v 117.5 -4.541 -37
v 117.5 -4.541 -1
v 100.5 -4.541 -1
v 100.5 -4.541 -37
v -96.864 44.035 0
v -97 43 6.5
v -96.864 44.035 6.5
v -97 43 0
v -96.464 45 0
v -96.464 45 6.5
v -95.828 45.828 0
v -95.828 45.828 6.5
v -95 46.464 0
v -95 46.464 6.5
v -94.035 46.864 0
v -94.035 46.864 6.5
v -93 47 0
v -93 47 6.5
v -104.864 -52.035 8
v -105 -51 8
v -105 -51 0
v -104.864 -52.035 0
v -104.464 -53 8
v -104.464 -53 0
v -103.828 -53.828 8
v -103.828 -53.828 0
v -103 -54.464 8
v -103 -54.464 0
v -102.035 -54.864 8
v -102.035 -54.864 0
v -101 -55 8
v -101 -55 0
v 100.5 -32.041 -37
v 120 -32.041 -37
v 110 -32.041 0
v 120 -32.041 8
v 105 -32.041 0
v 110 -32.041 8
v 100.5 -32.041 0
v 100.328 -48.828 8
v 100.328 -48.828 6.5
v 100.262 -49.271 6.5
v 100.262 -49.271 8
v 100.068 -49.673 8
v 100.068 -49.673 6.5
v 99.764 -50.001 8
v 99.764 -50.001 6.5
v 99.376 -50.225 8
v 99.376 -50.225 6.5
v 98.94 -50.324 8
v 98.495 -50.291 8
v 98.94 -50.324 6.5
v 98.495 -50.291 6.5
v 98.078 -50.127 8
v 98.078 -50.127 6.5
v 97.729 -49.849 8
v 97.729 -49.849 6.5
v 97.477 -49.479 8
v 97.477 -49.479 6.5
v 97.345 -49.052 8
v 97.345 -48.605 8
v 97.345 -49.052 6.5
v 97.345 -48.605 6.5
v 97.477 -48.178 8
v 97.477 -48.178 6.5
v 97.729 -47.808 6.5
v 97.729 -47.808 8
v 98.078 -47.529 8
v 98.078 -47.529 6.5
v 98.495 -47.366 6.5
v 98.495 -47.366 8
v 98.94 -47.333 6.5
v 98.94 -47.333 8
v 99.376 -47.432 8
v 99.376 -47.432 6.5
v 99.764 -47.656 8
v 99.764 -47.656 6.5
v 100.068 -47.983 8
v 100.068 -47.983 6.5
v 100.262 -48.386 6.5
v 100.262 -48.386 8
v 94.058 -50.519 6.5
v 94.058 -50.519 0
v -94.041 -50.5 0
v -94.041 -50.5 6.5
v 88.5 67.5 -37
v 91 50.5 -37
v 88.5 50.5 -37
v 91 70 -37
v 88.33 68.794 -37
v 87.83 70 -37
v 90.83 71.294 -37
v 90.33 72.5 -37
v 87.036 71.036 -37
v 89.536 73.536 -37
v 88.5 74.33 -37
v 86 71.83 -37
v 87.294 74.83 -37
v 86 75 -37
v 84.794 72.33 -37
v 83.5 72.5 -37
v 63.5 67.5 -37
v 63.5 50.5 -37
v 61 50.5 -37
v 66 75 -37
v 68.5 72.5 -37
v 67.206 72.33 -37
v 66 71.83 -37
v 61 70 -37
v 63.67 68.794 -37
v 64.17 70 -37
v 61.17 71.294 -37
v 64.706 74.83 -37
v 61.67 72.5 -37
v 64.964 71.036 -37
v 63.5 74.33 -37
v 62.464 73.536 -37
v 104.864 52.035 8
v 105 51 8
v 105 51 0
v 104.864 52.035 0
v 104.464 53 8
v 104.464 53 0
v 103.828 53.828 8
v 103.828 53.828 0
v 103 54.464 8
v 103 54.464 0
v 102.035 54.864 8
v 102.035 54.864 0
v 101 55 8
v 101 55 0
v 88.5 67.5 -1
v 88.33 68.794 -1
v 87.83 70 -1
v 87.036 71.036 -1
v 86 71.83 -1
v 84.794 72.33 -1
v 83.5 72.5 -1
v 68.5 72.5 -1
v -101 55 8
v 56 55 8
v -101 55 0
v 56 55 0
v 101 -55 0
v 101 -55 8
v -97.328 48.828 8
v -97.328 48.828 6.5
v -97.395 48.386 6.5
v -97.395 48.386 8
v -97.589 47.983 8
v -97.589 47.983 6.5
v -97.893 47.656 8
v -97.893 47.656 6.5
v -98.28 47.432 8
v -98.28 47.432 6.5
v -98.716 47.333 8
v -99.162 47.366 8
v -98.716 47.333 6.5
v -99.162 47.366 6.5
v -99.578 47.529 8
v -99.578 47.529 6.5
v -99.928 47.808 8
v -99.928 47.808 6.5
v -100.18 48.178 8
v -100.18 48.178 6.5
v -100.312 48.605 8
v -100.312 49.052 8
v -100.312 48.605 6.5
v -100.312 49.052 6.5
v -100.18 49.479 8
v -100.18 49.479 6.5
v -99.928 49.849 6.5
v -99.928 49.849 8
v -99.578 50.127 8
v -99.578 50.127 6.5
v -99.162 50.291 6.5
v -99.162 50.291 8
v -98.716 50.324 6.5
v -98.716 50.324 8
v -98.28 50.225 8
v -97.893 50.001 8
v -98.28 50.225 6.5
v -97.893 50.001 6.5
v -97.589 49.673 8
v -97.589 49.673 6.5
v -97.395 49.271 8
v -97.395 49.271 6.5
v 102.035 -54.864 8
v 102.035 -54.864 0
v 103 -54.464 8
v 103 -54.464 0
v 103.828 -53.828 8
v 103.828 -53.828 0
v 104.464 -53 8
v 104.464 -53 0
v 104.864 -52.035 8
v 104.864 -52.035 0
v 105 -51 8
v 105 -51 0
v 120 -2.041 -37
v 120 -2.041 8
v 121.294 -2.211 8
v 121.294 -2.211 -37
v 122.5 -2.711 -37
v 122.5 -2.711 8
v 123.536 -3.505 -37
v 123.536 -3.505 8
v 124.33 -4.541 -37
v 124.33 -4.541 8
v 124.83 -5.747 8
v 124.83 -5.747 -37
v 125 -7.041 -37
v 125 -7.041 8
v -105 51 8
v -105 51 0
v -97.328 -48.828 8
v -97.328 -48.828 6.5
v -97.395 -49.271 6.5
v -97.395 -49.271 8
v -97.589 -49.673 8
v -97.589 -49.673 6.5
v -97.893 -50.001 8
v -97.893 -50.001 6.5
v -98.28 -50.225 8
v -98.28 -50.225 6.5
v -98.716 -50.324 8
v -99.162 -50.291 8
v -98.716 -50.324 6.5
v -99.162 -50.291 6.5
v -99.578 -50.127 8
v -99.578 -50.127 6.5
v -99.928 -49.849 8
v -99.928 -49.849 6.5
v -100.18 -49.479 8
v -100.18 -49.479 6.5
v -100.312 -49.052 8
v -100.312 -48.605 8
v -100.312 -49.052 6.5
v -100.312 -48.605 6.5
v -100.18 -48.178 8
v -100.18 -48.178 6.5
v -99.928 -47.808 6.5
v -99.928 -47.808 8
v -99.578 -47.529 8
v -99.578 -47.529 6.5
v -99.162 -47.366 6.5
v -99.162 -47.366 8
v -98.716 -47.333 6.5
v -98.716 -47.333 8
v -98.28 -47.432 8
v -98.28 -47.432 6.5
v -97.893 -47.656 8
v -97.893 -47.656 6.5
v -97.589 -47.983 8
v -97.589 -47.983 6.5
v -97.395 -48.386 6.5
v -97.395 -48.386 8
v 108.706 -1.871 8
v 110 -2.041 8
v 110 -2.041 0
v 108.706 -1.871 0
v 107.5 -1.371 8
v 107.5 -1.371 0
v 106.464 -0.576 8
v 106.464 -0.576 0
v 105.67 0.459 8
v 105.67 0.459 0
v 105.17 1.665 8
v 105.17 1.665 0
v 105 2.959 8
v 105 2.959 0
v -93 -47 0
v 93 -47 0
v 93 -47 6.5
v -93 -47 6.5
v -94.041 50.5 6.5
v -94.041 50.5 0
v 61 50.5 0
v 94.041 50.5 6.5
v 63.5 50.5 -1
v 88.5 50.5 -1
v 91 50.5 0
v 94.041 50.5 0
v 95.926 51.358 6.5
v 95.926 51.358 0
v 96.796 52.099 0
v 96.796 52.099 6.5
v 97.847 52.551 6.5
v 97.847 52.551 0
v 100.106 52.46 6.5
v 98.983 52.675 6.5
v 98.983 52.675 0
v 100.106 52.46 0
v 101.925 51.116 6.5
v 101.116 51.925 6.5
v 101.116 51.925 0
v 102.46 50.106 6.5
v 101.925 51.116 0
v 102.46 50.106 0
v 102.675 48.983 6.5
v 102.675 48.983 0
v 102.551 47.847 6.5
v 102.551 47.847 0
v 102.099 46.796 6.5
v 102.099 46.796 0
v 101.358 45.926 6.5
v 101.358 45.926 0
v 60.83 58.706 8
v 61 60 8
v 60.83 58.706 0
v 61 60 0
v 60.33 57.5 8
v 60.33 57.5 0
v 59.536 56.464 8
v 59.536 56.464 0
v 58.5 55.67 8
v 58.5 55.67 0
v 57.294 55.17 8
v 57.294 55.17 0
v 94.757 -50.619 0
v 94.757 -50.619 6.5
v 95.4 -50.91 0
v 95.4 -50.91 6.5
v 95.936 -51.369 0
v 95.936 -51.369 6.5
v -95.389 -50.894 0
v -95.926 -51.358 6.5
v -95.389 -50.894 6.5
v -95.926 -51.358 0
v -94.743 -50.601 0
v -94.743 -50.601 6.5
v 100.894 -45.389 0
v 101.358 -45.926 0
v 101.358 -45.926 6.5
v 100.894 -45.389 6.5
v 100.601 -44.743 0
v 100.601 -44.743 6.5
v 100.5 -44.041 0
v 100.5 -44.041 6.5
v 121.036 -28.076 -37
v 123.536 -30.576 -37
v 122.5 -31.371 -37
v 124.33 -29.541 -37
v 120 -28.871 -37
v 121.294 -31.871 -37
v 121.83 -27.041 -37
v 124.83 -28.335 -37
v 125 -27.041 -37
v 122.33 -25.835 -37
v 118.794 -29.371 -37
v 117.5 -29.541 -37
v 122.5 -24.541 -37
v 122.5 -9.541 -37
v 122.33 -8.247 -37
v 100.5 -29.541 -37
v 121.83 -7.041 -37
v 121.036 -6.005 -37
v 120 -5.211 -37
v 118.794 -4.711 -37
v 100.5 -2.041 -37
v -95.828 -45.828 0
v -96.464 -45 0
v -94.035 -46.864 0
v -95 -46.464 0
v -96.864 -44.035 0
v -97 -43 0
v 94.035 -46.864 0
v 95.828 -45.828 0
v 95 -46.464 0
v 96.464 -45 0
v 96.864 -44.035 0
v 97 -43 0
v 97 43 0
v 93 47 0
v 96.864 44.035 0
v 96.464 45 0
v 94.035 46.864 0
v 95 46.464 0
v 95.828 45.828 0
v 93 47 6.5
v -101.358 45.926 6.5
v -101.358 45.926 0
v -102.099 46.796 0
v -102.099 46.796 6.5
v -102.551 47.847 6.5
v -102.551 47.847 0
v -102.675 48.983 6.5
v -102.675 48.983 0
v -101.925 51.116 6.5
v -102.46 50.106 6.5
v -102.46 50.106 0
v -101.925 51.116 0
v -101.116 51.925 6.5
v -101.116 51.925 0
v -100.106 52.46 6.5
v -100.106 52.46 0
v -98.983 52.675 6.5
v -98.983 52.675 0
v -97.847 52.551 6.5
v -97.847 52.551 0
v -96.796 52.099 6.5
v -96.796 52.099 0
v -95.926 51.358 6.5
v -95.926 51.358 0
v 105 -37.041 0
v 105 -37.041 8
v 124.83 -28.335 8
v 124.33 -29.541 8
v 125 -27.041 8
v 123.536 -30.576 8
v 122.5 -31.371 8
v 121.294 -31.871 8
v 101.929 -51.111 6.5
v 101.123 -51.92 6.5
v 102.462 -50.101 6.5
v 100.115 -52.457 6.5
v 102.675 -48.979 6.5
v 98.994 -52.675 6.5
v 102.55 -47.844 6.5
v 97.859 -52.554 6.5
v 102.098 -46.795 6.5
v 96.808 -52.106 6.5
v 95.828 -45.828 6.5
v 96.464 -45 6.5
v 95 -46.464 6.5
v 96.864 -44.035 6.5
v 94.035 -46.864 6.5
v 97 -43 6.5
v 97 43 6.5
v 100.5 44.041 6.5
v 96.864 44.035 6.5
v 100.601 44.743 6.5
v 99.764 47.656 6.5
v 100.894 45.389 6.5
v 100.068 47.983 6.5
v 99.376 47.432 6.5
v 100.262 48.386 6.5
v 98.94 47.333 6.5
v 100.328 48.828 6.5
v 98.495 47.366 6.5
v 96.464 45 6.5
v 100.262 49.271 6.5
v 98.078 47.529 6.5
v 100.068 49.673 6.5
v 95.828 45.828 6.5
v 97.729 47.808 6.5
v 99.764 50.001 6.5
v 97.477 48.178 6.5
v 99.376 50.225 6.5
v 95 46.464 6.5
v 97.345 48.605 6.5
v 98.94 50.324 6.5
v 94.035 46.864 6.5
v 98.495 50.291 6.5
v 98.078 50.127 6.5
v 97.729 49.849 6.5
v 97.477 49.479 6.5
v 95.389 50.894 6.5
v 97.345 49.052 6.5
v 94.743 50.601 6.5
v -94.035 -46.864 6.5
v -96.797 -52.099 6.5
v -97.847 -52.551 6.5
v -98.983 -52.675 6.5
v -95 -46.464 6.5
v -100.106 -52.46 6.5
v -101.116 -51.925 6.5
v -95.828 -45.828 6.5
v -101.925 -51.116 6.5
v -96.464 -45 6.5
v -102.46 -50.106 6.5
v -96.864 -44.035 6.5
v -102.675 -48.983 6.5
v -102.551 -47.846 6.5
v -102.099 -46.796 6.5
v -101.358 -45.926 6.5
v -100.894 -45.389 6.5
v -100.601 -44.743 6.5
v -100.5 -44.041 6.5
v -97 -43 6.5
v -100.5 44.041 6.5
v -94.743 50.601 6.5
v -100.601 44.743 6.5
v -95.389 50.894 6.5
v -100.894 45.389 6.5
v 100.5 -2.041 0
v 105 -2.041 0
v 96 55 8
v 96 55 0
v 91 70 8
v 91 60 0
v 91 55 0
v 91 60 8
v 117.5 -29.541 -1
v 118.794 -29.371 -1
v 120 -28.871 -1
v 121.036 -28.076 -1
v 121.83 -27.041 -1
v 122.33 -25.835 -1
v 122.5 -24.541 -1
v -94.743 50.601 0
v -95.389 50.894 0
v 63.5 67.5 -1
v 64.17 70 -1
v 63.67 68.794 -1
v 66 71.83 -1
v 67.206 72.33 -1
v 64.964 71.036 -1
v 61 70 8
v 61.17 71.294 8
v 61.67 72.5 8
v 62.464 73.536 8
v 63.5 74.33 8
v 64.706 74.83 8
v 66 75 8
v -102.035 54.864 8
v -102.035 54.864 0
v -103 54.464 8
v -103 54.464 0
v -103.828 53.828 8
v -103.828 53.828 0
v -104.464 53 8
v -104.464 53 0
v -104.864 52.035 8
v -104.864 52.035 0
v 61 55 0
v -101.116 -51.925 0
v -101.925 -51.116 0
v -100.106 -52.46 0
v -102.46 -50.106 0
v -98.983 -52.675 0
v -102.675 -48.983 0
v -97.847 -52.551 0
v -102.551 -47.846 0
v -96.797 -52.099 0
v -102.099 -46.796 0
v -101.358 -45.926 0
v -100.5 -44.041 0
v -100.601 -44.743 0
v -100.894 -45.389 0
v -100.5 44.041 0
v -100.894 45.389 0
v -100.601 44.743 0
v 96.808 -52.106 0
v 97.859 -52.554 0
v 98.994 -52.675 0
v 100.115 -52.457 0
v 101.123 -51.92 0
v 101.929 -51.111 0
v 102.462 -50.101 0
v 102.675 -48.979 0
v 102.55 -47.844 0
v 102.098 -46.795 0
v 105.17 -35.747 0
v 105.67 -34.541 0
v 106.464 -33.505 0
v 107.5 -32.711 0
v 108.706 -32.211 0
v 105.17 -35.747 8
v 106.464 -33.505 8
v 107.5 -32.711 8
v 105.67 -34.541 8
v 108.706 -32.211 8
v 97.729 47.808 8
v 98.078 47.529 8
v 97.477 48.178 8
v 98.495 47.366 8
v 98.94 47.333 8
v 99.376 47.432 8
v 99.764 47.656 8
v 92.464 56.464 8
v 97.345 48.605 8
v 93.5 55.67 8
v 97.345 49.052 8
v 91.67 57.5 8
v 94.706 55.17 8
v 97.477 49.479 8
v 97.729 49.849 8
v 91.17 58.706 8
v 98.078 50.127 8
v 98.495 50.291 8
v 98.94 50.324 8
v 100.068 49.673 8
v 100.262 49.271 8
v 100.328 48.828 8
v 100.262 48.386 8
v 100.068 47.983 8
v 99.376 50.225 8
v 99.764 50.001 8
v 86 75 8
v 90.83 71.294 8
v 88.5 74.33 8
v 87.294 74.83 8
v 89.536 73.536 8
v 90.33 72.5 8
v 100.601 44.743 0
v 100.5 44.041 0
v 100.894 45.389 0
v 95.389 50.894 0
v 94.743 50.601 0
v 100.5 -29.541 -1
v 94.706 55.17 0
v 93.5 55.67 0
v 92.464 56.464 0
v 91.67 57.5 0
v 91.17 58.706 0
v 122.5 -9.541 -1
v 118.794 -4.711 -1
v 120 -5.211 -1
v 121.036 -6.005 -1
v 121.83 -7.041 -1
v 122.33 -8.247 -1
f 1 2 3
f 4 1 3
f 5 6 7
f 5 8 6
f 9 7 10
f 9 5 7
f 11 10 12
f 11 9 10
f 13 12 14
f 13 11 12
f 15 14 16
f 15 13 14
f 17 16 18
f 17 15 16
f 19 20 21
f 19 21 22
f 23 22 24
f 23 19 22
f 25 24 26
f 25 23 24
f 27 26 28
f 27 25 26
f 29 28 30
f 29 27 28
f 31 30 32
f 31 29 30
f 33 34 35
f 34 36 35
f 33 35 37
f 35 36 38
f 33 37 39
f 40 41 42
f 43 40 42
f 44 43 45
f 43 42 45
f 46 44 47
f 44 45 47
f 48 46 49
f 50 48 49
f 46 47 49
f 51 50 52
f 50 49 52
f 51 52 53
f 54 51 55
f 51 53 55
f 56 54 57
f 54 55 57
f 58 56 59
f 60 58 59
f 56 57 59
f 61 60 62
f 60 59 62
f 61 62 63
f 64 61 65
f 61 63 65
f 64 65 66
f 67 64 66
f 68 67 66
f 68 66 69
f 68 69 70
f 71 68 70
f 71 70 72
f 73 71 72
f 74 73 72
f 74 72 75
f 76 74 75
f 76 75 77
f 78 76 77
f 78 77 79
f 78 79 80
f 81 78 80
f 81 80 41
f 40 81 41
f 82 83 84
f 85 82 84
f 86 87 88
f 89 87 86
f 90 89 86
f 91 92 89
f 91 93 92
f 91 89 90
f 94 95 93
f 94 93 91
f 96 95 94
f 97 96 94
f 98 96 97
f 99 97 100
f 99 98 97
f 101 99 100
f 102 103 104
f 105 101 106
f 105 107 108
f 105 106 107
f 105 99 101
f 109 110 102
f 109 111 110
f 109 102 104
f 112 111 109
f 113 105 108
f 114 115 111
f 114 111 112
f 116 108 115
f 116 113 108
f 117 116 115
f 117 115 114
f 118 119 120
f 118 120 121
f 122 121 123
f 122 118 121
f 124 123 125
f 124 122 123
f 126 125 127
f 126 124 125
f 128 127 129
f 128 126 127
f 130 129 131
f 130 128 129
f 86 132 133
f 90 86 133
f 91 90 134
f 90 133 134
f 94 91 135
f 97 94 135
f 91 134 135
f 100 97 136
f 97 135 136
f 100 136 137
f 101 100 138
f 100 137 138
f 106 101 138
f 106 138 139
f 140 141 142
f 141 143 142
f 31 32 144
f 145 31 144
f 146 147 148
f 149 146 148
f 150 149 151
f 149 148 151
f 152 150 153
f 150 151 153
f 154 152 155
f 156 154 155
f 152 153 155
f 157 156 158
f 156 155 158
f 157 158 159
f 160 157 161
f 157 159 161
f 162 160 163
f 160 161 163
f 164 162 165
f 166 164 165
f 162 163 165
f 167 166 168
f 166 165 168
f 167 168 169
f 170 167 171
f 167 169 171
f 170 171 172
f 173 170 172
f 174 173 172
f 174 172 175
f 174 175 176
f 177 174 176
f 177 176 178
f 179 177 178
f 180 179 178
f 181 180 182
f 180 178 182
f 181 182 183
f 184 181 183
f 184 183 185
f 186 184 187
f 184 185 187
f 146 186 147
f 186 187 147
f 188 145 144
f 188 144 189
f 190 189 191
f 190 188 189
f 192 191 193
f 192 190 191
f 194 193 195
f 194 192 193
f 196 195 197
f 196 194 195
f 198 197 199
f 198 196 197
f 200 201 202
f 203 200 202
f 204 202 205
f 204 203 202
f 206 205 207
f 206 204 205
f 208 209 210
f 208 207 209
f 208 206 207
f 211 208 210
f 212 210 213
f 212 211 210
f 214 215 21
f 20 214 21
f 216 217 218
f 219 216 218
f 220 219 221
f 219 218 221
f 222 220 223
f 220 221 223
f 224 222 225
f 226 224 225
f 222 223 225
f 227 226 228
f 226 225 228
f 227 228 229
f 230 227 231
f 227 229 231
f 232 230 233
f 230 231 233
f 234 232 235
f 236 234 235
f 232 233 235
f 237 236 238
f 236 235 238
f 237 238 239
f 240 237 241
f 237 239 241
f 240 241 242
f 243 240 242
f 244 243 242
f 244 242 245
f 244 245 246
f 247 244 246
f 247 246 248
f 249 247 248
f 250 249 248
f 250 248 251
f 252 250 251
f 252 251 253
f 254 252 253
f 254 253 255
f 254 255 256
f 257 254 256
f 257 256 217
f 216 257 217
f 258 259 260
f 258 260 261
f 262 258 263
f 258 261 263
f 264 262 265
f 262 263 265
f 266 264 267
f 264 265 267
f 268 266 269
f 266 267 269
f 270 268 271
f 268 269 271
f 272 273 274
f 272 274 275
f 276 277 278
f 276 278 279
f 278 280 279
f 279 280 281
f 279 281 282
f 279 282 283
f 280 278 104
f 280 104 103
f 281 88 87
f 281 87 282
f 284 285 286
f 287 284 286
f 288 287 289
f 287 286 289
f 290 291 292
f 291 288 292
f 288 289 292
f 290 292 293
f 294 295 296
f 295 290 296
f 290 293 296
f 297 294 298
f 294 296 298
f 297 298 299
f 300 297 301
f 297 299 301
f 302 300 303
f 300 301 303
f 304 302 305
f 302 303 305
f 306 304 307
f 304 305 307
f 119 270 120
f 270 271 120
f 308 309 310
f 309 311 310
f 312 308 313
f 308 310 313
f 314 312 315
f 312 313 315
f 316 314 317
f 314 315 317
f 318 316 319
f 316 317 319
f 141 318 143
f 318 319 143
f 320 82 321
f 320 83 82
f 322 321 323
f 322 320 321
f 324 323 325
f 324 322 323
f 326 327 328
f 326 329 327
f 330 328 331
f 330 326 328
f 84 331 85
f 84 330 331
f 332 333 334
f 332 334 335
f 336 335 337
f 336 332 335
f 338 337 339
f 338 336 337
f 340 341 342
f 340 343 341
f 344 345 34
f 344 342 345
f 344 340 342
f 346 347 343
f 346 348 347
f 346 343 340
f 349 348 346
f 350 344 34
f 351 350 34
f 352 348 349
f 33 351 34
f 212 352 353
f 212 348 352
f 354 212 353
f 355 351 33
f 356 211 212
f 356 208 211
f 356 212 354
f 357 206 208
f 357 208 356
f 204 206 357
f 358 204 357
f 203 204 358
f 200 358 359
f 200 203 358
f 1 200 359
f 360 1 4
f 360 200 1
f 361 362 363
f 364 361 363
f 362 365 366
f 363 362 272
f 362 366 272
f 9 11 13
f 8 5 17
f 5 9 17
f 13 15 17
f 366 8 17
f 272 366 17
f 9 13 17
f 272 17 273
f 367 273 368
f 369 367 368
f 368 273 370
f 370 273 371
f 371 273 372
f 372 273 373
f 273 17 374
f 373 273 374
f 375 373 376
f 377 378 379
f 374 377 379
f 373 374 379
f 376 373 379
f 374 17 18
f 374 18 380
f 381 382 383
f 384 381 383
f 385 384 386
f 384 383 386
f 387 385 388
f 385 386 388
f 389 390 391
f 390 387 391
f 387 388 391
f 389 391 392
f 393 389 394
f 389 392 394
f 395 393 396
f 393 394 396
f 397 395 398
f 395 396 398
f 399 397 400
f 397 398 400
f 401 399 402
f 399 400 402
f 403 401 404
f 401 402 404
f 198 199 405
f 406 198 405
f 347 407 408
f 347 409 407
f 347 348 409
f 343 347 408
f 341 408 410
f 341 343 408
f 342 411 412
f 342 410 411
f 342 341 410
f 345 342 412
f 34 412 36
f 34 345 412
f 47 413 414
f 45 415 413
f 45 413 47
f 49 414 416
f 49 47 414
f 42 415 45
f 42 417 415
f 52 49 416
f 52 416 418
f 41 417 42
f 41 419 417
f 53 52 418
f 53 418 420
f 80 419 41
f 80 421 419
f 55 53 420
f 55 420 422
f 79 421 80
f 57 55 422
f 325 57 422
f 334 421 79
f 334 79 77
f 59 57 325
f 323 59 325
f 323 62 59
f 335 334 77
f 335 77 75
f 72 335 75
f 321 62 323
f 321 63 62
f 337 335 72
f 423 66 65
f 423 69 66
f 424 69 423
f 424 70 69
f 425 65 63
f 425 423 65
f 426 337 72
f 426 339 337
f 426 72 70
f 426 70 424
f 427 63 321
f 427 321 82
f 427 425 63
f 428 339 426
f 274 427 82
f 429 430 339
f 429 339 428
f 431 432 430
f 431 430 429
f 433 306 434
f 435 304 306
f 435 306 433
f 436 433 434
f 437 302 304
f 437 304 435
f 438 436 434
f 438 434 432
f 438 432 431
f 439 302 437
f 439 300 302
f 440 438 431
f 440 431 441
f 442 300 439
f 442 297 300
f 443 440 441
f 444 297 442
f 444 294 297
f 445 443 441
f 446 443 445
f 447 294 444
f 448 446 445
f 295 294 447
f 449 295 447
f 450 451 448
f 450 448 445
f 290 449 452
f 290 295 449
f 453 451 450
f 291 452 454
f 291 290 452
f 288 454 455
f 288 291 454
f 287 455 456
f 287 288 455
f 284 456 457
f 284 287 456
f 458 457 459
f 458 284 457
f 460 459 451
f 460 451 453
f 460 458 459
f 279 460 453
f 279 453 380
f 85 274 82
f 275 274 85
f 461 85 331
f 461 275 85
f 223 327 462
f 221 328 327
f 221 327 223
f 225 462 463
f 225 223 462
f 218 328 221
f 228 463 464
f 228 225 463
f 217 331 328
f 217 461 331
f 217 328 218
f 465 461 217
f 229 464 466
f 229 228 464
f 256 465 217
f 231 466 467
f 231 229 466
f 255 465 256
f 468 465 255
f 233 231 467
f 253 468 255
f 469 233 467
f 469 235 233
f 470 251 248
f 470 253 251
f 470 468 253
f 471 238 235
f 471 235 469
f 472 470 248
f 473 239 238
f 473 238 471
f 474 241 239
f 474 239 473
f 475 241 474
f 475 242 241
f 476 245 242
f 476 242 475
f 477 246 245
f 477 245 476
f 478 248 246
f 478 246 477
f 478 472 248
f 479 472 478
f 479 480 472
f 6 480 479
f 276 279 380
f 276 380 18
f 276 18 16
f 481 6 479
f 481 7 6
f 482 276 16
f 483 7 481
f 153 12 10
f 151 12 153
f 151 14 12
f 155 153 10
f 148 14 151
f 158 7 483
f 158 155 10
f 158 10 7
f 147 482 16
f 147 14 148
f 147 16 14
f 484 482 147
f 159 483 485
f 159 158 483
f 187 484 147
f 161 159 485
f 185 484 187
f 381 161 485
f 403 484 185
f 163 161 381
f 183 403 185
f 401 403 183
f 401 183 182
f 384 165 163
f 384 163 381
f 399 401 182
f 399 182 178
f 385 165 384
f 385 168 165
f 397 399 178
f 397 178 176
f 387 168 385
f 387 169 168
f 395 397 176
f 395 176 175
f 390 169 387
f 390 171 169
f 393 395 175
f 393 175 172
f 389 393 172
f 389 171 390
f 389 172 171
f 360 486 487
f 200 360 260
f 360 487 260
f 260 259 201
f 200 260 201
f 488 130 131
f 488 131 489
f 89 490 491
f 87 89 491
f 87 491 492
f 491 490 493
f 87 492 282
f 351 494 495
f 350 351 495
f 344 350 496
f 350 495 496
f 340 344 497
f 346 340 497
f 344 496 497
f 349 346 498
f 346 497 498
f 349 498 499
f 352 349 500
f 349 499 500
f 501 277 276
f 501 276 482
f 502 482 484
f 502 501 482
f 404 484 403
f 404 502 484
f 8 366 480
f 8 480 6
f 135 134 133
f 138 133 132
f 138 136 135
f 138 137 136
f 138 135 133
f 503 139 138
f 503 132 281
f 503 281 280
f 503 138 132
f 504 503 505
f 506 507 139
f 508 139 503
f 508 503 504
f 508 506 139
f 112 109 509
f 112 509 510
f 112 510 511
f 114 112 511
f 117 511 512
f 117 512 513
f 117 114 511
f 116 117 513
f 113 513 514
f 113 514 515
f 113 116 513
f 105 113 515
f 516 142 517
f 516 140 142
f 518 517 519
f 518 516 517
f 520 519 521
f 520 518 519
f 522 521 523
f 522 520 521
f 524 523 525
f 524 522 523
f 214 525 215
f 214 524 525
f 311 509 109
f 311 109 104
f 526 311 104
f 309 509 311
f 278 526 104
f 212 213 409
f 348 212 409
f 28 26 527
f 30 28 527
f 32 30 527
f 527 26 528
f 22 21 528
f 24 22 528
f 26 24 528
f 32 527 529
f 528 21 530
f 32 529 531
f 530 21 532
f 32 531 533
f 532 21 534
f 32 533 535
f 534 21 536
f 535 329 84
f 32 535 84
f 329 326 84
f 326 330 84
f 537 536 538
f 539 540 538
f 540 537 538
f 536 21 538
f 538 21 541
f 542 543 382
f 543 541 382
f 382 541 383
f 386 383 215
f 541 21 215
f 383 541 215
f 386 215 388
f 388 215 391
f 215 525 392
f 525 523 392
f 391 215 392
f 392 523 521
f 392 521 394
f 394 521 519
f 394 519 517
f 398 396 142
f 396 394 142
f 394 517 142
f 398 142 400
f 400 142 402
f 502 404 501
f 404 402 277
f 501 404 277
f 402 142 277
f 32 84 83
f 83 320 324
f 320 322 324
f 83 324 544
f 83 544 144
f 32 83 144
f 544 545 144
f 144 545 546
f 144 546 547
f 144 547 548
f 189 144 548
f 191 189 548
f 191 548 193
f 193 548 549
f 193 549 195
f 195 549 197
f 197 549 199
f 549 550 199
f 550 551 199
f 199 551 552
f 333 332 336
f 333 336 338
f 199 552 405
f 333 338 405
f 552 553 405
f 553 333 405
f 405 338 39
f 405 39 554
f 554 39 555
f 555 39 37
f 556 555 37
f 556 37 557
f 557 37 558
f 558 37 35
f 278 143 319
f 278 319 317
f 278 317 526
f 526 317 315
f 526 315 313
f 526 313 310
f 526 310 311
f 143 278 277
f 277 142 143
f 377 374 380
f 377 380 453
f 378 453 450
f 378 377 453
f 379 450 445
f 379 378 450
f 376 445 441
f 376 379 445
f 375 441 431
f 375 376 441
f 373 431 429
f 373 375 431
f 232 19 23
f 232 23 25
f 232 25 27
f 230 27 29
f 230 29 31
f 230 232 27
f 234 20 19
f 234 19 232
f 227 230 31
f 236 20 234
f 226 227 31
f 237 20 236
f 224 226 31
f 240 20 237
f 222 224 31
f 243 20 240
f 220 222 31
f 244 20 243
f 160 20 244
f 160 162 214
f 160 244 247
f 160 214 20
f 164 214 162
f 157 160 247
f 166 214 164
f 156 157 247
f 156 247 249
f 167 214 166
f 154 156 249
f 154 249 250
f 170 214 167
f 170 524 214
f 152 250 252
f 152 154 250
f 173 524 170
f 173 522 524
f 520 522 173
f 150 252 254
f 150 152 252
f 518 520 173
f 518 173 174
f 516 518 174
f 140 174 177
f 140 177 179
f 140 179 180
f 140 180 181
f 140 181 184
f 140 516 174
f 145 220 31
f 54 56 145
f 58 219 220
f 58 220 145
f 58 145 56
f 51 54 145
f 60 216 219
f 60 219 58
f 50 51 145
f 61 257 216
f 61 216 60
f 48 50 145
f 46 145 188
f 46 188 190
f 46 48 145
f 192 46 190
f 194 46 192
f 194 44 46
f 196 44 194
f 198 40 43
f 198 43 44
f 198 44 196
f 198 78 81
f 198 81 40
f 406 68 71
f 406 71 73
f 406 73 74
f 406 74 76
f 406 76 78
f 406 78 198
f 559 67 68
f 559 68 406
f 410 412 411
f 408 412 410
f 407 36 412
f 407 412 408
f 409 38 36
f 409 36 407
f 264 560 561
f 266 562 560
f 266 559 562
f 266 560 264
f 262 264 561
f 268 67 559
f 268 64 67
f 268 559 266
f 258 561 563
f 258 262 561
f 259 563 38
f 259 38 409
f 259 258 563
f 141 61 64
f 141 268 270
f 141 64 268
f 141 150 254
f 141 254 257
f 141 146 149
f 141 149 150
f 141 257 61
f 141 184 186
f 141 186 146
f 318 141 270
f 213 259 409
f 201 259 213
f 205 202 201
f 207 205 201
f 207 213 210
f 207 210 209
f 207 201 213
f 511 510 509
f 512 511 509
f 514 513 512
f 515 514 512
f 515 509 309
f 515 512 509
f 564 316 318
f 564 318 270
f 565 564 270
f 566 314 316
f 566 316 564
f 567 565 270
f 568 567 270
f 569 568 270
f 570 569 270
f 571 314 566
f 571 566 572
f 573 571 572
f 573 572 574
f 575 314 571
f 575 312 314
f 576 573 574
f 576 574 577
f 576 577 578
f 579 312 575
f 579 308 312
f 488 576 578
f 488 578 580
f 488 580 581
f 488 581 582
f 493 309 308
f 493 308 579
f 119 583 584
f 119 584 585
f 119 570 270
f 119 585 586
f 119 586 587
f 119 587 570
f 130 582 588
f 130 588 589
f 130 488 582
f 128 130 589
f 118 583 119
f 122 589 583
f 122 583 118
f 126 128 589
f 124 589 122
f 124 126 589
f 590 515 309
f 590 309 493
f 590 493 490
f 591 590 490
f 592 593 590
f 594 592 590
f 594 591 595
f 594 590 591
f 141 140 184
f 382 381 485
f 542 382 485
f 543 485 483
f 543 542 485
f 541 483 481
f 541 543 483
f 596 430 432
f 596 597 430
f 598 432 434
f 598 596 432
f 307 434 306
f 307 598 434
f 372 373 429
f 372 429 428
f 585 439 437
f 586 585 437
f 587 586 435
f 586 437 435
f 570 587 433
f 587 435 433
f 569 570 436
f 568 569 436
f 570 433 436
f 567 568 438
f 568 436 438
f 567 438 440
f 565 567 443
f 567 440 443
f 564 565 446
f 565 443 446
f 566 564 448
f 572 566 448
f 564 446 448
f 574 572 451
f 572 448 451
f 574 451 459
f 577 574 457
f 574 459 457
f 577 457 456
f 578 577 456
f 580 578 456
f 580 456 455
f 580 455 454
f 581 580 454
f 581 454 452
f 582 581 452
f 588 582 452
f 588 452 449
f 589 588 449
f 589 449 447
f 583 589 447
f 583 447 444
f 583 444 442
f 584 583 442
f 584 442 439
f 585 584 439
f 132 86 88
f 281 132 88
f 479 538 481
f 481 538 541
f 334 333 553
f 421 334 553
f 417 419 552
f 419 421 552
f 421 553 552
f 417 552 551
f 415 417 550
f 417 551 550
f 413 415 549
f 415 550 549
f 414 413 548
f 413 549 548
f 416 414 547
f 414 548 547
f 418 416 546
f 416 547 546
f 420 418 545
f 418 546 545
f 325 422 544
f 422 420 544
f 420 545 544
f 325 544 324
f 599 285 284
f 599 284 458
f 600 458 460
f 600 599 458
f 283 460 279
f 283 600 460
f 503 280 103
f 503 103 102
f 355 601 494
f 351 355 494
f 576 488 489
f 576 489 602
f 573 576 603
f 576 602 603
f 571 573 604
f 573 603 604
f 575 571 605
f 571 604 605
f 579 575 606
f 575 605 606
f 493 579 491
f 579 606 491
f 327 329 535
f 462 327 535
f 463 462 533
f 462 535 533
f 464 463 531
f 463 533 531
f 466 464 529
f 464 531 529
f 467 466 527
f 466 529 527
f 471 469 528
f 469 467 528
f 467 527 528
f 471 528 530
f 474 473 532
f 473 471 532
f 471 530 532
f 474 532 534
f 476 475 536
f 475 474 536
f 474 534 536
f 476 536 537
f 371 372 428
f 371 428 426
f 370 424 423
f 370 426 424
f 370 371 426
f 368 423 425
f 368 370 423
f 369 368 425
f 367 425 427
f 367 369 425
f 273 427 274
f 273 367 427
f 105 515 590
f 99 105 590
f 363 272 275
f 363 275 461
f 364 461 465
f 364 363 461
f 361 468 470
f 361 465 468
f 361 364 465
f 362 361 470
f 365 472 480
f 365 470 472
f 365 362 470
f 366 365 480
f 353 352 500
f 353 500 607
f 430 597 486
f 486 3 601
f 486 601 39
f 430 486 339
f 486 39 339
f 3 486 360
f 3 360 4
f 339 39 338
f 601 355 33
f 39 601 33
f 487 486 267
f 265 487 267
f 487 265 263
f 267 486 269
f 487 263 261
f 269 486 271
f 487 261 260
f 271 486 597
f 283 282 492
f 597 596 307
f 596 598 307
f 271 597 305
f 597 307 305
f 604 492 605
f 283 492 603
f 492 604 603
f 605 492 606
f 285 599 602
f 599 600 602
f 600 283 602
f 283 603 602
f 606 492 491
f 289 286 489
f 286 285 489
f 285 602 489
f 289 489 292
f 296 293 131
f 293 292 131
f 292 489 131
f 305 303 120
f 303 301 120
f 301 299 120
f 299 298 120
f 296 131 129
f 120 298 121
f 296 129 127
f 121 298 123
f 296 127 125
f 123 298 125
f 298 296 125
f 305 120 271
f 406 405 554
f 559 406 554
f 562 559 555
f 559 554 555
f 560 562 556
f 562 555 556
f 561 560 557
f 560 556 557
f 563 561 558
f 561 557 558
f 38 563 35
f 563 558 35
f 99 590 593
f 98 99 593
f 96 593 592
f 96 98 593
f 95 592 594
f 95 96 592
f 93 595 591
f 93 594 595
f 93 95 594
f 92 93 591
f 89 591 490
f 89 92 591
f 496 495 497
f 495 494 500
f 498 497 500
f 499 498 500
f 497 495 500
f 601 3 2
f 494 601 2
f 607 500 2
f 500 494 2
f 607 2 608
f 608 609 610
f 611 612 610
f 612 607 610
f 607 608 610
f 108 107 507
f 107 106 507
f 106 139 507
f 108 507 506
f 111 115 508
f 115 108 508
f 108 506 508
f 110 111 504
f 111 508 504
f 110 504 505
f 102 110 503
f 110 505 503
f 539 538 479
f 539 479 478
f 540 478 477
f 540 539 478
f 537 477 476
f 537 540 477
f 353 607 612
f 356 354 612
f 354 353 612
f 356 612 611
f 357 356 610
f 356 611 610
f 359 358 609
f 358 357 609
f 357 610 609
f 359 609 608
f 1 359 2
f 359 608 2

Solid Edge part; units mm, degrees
sketch "Sketch1" plane through (0, 0, 0) normal (0, 0, 1) x (1, 0, 0)
  line L0 (-105, 55) -> (-105, -55)
  line L1 (-105, -55) -> (105, -55)
  line L2 (105, -55) -> (105, 55)
  line L3 (105, 55) -> (-105, 55)
extrude "Protrusion1" add sketch "Sketch1" along normal blind 8
sketch "Sketch2" plane through (0, 0, 0) normal (0, 0, -1) x (1, 0, 0)
  line L0 (-94.0409, -50.5) -> (94.0409, -50.5)
  arc A0 (95.9257, -51.3576) -> (94.0409, -50.5) centre (94.0409, -53) ccw
  arc A1 (101.3576, -45.9257) -> (95.9257, -51.3576) centre (98.8284, -48.8284) cw
  arc A2 (100.5, -44.0409) -> (101.3576, -45.9257) centre (103, -44.0409) ccw
  line L1 (100.5, -44.0409) -> (100.5, 44.0409)
  arc A3 (101.3576, 45.9257) -> (100.5, 44.0409) centre (103, 44.0409) ccw
  arc A4 (95.9359, 51.3692) -> (101.3576, 45.9257) centre (98.8284, 48.8284) cw
  arc A5 (94.0579, 50.5191) -> (95.9359, 51.3692) centre (94.0576, 53.0191) ccw
  line L2 (94.0579, 50.5191) -> (-94.0408, 50.5001)
  arc A6 (-95.9258, 51.3577) -> (-94.0408, 50.5001) centre (-94.041, 53.0001) ccw
  arc A7 (-101.3576, 45.9257) -> (-95.9258, 51.3577) centre (-98.8284, 48.8284) cw
  arc A8 (-100.5, 44.0409) -> (-101.3576, 45.9257) centre (-103, 44.0409) ccw
  line L3 (-100.5, 44.0409) -> (-100.5, -44.0409)
  arc A9 (-101.3576, -45.9257) -> (-100.5, -44.0409) centre (-103, -44.0409) ccw
  arc A10 (-95.9257, -51.3576) -> (-101.3576, -45.9257) centre (-98.8284, -48.8284) cw
  arc A11 (-94.0409, -50.5) -> (-95.9257, -51.3576) centre (-94.0409, -53) ccw
  line L4 (97, -43) -> (97, 43)
  arc A12 (93, 47) -> (97, 43) centre (93, 43) cw
  line L5 (93, 47) -> (-93, 47)
  arc A13 (-97, 43) -> (-93, 47) centre (-93, 43) cw
  line L6 (-97, 43) -> (-97, -43)
  arc A14 (-97, -43) -> (-93, -47) centre (-93, -43) ccw
  line L7 (-93, -47) -> (93, -47)
  arc A15 (97, -43) -> (93, -47) centre (93, -43) cw
extrude "Wycięcie_1" cut sketch "Sketch2" against normal blind 6.5
sketch "Sketch3" plane through (0, 0, 0) normal (0, 0, -1) x (1, 0, 0)
  circle A0 centre (-98.8284, 48.8284) radius 1.5
  circle A1 centre (98.8284, 48.8284) radius 1.5
  circle A2 centre (98.8284, -48.8284) radius 1.5
  circle A3 centre (-98.8284, -48.8284) radius 1.5
extrude "Wycięcie_2" cut sketch "Sketch3" against normal blind 159.0153
fillet "Zaokrąglenie_1" radius 4 4 edges at (105, -55, 4) (105, 55, 4) (-105, 55, 4) (-105, -55, 4)
sketch "Sketch4" plane through (0, 0, 8) normal (0, 0, 1) x (0, 1, 0)
  line L0 (55, -61) -> (75, -61)
  line L1 (75, -61) -> (75, -91)
  line L2 (75, -91) -> (55, -91)
  line L3 (50.5, -91) -> (55, -91)
  line L4 (50.5, -61) -> (50.5, -91)
  line L5 (55, -61) -> (50.5, -61)
  line L6 (-32.0409, -125) -> (-32.0409, -105)
  line L7 (-32.0409, -105) -> (-32.0409, -100.5)
  line L8 (-32.0409, -100.5) -> (-2.0409, -100.5)
  line L9 (-2.0409, -100.5) -> (-2.0409, -105)
  line L10 (-2.0409, -105) -> (-2.0409, -125)
  line L11 (-2.0409, -125) -> (-32.0409, -125)
extrude "Wyciągnięcie_2" add sketch "Sketch4" against normal blind 45
sketch "Sketch5" plane through (76, 65, -37) normal (0, 0, -1) x (-1, 0, 0)
  line L0 (-12.5, -15.515) -> (12.5, -15.515)
  line L1 (12.5, -15.515) -> (12.5, 7.5)
  line L2 (0, 7.5) -> (12.5, 7.5)
  line L3 (0, 7.5) -> (-12.5, 7.5)
  line L4 (-12.5, 7.5) -> (-12.5, -15.515)
  line L5 (-46.5, -82.0409) -> (-46.5, -69.5409)
  line L6 (-46.5, -69.5409) -> (-23.2142, -69.5409)
  line L7 (-23.2142, -69.5409) -> (-23.2142, -94.5409)
  line L8 (-23.2142, -94.5409) -> (-46.5, -94.5409)
  line L9 (-46.5, -94.5409) -> (-46.5, -82.0409)
extrude "Wycięcie_3" cut sketch "Sketch5" against normal blind 36
fillet "Zaokrąglenie_2" radius 5 12 edges at (105, -2.0409, 4) (125, -2.0409, -14.5) (125, -32.0409, -14.5) (105, -32.0409, 4) (91, 75, -14.5) (91, 55, 4) (61, 55, 4) (61, 75, -14.5) (63.5, 72.5, -19) (88.5, 72.5, -19) (122.5, -4.5409, -19) (122.5, -29.5409, -19)
